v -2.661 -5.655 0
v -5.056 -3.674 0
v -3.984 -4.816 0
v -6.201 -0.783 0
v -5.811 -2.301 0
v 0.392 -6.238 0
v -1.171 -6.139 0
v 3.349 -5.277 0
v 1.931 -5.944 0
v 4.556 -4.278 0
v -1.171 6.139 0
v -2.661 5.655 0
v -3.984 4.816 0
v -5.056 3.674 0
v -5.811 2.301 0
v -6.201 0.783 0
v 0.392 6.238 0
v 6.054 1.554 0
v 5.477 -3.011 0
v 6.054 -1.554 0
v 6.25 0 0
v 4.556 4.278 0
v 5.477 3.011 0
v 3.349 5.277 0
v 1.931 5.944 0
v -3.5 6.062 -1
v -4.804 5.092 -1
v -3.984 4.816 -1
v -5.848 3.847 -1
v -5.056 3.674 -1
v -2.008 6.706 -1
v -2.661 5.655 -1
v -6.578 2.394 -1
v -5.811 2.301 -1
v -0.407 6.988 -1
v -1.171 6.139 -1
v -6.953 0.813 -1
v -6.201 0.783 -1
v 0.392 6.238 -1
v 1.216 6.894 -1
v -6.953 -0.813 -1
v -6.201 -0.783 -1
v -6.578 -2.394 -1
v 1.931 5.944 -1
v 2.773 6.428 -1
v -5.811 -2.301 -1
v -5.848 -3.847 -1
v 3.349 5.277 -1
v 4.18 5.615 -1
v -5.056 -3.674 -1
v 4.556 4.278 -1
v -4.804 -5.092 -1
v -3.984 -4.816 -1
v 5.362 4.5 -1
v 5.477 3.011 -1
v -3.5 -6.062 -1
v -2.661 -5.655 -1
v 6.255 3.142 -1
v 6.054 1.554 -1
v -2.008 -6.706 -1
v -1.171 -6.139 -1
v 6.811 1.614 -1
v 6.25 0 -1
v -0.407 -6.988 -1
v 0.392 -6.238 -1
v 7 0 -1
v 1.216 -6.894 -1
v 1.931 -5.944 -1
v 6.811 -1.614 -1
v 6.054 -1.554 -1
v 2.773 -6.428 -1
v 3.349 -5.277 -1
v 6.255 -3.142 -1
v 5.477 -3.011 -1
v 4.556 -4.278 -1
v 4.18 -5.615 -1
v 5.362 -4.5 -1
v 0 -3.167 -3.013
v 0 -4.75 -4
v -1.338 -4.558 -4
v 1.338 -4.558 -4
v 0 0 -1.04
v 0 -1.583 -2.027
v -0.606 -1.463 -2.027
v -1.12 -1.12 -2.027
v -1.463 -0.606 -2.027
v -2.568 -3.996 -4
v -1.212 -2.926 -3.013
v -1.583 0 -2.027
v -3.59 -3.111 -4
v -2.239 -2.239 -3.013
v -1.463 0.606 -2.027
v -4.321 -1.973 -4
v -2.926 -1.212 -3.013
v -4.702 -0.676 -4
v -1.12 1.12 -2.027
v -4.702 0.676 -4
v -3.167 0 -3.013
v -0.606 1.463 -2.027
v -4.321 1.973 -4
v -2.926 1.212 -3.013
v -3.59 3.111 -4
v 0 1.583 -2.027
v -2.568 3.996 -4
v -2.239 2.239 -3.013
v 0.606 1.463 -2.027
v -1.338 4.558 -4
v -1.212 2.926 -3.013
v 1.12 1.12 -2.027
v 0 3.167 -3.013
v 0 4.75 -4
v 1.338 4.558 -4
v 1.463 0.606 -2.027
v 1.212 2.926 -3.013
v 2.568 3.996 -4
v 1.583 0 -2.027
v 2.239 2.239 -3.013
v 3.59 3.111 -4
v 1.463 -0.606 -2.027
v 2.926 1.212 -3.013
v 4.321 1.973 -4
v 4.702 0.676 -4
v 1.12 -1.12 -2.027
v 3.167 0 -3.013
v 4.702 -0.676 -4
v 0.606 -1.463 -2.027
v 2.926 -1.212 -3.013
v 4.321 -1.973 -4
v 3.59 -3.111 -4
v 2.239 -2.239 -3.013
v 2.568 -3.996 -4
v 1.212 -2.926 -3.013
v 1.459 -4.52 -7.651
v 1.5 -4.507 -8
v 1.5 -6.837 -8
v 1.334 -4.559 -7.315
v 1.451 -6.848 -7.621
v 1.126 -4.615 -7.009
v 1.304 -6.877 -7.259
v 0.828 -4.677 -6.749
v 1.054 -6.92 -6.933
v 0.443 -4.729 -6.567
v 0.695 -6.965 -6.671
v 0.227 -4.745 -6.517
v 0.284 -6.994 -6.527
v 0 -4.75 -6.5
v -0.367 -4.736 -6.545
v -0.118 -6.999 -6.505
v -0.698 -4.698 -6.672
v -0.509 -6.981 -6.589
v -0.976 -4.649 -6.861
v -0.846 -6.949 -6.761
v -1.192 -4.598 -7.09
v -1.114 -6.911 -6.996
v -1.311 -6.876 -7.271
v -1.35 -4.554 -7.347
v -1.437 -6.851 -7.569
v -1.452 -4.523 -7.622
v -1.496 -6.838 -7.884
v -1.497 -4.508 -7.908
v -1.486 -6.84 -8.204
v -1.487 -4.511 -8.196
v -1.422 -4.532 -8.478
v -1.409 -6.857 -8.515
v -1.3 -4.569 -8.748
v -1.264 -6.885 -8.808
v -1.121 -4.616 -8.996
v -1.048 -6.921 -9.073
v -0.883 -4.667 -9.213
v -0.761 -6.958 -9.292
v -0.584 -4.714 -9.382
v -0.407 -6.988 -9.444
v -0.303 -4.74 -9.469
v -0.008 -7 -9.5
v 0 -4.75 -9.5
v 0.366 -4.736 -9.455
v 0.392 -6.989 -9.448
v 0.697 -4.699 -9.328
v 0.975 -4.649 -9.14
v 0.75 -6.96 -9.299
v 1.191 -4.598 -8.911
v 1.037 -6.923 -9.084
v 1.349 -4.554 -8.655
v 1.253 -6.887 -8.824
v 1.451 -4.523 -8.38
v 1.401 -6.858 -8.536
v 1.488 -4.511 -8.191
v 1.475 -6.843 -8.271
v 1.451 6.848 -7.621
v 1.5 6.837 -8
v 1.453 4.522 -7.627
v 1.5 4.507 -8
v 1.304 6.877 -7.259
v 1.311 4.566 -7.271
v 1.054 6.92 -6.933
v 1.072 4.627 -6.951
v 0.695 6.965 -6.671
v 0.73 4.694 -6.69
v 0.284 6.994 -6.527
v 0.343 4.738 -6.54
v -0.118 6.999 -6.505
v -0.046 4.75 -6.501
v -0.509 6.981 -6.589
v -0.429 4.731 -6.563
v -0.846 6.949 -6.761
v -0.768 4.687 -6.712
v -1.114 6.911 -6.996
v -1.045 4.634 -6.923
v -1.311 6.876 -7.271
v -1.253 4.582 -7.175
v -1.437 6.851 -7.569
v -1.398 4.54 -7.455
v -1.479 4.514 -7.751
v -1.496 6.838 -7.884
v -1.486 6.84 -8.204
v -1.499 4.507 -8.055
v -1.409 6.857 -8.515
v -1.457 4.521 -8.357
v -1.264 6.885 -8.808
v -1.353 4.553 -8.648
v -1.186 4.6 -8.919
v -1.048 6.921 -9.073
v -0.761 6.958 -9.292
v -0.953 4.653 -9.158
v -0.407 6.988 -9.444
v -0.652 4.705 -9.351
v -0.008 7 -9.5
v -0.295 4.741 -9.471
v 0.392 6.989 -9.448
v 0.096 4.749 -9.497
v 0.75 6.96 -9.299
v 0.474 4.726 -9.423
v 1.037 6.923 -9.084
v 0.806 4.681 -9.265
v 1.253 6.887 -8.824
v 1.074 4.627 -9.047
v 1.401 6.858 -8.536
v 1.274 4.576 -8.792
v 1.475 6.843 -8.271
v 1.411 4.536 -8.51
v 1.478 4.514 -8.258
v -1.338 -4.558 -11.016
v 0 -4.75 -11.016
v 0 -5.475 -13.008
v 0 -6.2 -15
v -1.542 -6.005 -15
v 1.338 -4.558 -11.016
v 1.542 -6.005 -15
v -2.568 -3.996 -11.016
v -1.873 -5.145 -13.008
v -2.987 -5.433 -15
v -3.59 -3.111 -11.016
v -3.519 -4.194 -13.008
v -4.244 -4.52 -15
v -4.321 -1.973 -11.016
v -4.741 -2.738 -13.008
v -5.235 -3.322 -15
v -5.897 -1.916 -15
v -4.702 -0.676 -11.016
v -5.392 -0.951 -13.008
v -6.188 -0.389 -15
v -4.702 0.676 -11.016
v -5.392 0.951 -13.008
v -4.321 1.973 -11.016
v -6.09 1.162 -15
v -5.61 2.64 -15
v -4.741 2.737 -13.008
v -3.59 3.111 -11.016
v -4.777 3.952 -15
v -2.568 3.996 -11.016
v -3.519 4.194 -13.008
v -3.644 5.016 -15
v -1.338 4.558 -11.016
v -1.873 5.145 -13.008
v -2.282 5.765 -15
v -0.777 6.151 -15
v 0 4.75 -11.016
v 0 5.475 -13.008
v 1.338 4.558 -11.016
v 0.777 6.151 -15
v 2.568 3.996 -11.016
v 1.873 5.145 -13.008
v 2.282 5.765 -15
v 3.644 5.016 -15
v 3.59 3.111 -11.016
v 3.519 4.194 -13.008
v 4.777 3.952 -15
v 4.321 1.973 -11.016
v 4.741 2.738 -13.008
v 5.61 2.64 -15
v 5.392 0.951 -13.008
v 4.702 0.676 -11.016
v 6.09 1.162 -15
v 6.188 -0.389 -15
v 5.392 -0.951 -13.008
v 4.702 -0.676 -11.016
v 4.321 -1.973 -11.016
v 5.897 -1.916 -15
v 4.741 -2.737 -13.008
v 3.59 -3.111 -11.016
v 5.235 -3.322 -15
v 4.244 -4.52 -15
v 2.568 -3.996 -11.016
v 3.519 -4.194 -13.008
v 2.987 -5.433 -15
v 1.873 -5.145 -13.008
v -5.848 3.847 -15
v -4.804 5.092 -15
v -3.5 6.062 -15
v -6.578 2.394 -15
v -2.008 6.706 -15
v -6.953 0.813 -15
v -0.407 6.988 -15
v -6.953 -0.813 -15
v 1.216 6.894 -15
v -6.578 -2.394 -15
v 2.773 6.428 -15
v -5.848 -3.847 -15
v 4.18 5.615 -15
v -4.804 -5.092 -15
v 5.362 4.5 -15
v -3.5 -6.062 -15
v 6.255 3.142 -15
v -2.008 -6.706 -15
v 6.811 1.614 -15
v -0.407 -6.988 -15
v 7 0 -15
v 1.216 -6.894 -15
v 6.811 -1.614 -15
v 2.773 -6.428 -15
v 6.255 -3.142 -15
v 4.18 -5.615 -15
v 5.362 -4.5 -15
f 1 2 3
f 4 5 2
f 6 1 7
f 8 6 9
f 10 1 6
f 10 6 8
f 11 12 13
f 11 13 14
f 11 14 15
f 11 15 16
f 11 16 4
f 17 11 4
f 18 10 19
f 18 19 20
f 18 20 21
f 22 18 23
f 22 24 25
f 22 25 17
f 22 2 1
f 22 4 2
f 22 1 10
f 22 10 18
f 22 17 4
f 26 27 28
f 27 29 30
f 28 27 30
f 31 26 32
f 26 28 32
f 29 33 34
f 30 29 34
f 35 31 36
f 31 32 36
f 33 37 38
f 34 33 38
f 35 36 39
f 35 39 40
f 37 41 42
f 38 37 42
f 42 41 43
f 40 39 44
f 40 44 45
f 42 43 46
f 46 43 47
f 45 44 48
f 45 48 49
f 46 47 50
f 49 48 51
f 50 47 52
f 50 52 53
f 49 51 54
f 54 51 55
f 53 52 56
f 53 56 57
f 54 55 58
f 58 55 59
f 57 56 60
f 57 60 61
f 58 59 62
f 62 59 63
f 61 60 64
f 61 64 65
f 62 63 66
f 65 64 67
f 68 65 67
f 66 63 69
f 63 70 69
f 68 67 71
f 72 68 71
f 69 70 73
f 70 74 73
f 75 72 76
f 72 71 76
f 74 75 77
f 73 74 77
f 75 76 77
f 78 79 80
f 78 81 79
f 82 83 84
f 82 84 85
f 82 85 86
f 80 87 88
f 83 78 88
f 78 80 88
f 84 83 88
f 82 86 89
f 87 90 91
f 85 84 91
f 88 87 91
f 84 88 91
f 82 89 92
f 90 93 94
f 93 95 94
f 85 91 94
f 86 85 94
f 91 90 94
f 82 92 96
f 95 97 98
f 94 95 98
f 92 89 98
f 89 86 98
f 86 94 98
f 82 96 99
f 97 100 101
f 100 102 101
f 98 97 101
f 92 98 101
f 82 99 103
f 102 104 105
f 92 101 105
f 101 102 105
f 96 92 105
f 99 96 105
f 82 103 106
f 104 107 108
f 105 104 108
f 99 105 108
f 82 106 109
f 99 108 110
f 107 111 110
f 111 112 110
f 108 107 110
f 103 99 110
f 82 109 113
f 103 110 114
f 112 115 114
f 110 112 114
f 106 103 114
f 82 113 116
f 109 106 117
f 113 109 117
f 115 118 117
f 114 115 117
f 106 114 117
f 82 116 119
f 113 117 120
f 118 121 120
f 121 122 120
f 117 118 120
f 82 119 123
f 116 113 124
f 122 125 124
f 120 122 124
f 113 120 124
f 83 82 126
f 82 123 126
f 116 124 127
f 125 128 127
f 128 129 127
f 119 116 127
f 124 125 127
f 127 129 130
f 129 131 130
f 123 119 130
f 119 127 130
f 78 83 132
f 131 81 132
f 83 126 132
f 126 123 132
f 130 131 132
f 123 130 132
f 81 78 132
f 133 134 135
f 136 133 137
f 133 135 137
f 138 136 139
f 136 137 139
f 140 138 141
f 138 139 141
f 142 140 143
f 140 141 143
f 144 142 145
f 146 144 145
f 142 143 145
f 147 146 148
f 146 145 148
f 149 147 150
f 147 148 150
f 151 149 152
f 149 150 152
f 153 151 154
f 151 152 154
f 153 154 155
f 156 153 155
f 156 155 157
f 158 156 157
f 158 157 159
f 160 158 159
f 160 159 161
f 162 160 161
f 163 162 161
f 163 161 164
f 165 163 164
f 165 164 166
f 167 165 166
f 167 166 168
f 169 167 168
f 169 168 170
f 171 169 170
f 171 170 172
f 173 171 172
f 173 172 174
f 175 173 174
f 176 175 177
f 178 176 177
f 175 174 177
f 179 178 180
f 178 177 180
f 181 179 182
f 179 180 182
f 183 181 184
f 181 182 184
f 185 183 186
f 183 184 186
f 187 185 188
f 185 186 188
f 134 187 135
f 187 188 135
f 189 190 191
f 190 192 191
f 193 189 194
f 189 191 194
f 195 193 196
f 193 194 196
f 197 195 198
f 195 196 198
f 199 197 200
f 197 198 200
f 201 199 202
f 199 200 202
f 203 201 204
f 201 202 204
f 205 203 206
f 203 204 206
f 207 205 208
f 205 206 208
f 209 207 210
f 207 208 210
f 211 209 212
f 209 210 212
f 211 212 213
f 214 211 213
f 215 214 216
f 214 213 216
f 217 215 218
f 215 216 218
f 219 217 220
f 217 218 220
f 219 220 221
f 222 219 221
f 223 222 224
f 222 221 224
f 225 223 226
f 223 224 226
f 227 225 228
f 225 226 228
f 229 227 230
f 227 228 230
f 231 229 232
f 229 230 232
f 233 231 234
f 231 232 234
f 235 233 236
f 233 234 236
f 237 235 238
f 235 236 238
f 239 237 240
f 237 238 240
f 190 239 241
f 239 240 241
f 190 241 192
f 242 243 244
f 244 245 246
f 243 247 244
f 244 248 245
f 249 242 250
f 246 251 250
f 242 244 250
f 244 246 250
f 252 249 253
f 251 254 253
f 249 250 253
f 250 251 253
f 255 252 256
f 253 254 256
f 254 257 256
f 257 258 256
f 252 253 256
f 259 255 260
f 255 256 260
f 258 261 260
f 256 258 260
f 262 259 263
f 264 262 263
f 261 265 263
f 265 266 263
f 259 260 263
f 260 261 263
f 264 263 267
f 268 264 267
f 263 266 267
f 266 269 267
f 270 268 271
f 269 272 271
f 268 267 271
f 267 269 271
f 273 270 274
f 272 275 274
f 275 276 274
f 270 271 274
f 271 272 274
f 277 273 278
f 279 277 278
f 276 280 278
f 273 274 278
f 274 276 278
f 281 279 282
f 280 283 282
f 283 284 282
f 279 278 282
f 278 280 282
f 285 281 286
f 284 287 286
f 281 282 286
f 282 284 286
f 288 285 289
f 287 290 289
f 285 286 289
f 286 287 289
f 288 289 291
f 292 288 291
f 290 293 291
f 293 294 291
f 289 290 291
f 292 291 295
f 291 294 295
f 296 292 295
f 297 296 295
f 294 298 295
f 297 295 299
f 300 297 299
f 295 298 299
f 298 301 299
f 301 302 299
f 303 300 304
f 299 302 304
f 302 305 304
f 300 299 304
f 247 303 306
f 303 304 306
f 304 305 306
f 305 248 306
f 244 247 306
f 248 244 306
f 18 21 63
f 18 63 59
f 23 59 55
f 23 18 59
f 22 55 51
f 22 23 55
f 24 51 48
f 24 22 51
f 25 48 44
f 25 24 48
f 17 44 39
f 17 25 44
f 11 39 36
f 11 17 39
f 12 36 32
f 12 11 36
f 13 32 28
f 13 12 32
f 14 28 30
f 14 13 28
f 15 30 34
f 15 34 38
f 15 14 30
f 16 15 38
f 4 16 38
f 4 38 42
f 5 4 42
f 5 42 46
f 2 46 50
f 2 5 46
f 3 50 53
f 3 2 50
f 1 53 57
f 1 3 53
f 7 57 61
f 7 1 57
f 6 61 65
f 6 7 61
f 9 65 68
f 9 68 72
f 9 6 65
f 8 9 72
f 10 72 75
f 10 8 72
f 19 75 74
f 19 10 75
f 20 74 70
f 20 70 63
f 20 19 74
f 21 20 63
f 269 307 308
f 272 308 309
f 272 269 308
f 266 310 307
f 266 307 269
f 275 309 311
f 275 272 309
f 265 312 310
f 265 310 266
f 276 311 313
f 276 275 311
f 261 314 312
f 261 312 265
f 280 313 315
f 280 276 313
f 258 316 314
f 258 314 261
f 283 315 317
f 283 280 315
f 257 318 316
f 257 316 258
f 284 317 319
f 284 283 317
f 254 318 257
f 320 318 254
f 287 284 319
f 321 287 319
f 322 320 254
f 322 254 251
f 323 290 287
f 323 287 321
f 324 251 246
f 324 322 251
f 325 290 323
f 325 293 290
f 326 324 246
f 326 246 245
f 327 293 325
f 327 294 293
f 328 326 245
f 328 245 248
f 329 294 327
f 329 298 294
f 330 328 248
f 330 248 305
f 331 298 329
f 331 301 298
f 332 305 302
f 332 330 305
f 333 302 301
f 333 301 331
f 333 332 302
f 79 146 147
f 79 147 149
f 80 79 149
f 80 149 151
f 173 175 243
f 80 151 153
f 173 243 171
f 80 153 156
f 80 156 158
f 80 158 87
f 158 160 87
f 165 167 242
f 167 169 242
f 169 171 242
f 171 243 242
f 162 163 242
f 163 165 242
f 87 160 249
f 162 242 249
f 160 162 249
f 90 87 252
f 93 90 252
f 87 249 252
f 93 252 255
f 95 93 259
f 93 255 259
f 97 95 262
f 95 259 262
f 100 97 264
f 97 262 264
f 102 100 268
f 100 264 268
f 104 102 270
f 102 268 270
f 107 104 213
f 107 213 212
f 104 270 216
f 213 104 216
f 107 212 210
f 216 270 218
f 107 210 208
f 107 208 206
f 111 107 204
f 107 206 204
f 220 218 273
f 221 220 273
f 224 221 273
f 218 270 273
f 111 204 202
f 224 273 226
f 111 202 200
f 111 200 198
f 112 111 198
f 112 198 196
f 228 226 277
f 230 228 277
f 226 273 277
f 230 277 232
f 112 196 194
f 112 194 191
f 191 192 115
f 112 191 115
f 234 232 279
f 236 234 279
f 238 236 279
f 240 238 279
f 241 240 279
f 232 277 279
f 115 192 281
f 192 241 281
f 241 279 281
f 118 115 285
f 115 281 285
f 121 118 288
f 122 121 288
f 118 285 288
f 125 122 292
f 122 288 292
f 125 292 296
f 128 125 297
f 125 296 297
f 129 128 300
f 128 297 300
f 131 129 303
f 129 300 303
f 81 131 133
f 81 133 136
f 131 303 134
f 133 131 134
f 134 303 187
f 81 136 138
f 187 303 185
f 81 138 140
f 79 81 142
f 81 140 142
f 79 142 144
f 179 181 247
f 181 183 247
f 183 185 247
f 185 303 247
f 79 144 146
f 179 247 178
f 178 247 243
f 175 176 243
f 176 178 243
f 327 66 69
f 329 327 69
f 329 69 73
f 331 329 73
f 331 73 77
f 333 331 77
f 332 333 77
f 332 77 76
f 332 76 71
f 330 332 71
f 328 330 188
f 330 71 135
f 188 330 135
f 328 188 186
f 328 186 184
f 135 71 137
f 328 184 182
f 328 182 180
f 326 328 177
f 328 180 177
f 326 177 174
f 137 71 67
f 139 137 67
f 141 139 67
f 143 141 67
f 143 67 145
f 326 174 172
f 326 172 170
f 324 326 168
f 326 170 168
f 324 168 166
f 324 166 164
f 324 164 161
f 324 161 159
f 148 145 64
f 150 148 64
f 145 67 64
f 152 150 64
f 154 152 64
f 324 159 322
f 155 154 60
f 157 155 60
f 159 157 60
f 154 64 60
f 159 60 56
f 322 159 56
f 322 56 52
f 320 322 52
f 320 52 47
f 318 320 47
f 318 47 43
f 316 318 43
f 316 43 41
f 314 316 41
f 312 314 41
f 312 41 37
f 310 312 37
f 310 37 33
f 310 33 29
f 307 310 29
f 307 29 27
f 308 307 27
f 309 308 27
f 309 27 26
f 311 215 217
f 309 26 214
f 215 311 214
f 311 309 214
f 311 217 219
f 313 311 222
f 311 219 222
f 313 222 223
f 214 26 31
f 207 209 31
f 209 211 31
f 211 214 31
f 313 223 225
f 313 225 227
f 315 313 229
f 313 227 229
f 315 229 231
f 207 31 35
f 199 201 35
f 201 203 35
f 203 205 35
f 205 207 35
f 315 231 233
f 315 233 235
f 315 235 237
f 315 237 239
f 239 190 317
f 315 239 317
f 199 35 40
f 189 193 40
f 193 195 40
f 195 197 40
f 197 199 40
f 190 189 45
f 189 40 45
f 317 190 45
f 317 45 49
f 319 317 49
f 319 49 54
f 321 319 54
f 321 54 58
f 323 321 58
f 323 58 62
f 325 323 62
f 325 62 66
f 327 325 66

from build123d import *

# Parameters (mm, degrees)
F0_R     = 6.25
F1_DEPTH = 1
F2_R     = 7
F3_DEPTH = 14
F6_R     = 1.5
F7_DEPTH = 12.5


with BuildPart() as f1:
    # F0 (on Top) → F1 (new body)
    with BuildSketch(Plane.XY):
        Circle(F0_R)
    extrude(amount=-F1_DEPTH)

    # F2 (on face) → F3 (join)
    with BuildSketch(Plane(origin=(0, 0, -1), x_dir=(1, 0, 0), z_dir=(0, 0, -1))):
        Circle(F2_R)
    extrude(amount=F3_DEPTH)

    # F4 (on Right) → F5 (revolve, cut)
    with BuildSketch(Plane.YZ):
        Polygon((0, -15), (0, -1.0399731109), (-4.75, -4), (-4.75, -11.0161577418), (-6.2, -15), align=None)
    revolve(axis=Axis((0, 0, -15), (0, 0, -1)), mode=Mode.SUBTRACT)

    # F6 (on Front) → F7 (cut, symmetric)
    with BuildSketch(Plane.XZ):
        with Locations((0, -8)):
            Circle(F6_R)
    extrude(amount=F7_DEPTH, both=True, mode=Mode.SUBTRACT)


solid = f1.part
